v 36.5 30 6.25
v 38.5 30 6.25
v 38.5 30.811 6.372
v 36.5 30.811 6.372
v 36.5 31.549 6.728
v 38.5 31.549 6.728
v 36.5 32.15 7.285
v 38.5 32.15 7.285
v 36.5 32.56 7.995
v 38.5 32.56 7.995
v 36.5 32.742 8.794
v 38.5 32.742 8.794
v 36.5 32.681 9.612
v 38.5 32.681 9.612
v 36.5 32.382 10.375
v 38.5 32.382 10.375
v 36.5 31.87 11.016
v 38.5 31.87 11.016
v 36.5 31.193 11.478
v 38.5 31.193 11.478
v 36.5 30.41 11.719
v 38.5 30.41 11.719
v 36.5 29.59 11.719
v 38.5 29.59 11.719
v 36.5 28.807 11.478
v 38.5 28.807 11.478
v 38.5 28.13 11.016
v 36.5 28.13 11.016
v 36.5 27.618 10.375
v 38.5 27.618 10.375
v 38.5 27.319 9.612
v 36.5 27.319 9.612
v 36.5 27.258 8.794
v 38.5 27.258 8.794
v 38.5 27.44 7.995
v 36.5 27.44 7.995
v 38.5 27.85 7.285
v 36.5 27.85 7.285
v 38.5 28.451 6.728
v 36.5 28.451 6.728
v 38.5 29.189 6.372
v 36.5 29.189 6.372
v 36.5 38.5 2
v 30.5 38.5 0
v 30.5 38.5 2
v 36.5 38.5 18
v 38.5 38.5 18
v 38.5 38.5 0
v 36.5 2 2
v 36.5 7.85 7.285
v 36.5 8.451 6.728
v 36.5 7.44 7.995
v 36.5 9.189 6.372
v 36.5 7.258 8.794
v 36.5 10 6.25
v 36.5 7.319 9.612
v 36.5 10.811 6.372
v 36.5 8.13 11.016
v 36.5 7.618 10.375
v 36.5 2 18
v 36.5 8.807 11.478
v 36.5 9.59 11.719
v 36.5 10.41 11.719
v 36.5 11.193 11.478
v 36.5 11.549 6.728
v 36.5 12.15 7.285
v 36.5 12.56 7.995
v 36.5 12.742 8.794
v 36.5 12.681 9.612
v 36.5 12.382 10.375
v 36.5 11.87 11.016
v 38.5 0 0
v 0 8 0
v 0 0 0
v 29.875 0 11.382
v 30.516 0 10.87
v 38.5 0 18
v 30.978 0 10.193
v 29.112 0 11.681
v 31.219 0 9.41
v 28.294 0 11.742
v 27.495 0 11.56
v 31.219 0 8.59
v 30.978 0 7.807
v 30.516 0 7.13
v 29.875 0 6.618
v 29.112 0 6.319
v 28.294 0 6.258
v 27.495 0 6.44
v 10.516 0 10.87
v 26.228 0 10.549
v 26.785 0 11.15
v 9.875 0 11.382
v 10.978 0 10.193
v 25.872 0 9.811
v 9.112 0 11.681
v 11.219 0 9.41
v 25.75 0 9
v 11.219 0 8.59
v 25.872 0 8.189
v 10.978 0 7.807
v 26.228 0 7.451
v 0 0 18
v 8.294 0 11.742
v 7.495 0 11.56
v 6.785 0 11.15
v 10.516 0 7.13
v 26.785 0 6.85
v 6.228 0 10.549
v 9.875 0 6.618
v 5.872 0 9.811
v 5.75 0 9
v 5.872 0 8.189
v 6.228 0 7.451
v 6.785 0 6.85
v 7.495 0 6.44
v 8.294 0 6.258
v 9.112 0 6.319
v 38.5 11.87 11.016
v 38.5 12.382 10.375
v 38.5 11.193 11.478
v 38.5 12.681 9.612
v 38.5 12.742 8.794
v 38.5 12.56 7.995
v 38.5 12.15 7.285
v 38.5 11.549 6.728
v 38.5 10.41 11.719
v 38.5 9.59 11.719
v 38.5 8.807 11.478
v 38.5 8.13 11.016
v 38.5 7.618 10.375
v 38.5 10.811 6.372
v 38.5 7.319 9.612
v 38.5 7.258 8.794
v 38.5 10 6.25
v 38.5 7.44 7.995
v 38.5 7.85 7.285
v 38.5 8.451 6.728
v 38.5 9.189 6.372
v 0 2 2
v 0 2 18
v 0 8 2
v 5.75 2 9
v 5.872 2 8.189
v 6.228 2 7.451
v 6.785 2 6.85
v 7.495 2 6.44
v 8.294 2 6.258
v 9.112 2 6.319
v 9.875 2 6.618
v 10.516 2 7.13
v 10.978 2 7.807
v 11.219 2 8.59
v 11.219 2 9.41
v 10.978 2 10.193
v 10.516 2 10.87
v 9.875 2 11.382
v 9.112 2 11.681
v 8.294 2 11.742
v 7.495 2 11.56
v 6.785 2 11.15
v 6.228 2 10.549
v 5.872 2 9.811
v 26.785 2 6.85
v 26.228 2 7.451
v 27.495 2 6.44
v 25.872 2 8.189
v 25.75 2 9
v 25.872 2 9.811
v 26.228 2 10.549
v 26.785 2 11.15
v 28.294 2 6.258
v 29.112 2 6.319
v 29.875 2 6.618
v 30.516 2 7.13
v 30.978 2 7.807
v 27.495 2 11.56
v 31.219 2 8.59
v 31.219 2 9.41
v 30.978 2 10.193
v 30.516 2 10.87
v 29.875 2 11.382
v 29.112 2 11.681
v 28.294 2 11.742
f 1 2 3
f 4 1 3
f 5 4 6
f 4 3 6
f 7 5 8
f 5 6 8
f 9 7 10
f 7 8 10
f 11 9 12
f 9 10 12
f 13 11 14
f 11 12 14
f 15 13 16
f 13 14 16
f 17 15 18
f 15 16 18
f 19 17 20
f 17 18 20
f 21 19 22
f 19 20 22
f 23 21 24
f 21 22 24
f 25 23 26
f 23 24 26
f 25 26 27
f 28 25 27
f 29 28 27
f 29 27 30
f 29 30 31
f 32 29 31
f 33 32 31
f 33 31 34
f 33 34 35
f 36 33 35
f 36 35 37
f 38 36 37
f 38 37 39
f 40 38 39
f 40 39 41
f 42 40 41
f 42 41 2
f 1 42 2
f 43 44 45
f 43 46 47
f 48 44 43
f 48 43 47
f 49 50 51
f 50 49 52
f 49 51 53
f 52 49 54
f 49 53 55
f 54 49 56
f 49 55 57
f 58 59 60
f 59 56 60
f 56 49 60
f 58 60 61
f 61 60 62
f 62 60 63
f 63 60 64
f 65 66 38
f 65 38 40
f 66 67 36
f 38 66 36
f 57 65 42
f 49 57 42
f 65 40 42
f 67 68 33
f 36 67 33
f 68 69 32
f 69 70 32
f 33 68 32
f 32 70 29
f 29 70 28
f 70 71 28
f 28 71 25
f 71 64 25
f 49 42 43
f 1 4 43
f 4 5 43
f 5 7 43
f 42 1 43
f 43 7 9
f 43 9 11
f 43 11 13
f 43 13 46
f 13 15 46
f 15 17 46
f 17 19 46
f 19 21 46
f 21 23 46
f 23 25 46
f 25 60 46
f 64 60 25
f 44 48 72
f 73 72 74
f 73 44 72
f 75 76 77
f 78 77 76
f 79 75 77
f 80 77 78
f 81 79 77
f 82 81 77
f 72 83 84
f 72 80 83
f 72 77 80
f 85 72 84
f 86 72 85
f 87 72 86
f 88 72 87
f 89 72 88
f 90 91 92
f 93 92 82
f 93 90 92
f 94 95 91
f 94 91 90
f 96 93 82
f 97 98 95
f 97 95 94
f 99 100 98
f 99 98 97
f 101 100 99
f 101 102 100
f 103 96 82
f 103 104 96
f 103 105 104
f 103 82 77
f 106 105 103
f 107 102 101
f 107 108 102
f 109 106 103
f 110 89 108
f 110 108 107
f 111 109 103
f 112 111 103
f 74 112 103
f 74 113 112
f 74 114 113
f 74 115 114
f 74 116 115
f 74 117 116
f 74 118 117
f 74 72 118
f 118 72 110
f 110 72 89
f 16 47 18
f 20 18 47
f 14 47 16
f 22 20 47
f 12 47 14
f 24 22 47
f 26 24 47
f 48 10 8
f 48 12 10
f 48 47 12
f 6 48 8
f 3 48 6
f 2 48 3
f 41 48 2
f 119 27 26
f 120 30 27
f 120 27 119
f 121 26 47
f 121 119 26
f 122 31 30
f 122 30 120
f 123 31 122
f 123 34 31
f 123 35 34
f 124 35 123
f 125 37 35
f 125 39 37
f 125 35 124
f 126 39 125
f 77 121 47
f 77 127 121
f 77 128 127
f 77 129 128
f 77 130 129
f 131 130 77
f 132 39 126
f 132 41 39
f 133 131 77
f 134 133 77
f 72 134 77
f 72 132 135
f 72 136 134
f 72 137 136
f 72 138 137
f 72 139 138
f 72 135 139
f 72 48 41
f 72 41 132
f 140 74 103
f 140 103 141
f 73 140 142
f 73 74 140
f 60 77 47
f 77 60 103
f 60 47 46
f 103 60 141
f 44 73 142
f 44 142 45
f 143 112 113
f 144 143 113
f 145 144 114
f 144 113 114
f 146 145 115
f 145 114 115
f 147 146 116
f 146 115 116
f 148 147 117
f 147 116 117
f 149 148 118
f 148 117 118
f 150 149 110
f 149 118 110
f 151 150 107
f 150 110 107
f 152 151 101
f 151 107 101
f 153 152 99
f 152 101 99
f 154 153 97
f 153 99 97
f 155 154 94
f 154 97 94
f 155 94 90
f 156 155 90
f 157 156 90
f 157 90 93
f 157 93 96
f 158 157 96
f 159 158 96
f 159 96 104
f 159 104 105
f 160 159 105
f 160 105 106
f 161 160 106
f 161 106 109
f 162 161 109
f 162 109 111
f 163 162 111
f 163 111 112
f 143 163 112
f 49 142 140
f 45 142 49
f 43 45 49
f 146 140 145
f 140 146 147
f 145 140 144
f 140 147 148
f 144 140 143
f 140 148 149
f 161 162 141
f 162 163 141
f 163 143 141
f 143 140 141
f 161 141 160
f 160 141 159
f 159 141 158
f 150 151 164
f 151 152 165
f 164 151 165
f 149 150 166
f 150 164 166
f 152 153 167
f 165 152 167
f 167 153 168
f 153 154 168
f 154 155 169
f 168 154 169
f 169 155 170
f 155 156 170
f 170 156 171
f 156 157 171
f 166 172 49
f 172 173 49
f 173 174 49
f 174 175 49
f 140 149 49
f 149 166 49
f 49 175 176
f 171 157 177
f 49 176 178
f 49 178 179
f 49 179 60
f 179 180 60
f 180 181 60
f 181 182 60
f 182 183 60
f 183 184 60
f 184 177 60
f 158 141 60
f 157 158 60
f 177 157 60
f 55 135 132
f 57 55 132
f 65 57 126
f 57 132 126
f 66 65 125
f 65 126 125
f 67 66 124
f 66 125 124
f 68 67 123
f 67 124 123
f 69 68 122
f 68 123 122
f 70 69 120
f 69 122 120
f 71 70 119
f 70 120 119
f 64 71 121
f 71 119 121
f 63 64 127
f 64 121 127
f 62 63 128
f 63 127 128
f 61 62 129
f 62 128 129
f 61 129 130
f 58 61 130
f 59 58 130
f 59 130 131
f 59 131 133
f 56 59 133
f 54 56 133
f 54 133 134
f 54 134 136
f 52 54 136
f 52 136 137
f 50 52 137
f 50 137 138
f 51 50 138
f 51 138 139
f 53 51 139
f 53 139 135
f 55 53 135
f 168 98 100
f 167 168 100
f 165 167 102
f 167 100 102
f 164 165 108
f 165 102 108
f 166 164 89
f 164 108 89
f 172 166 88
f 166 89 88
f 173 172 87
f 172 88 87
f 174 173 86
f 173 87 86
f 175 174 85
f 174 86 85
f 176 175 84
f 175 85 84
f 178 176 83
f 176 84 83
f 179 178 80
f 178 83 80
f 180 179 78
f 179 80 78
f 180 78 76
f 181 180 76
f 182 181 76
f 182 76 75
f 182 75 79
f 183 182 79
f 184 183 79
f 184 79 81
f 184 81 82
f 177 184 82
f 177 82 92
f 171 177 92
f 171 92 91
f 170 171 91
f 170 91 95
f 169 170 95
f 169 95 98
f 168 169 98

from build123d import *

# Parameters (mm, degrees)
EXTRUDE_1_DEPTH     = 18
CUT_EXTRUDE_1_DEPTH = 16
HOLE_WIZARD_M51_D   = 5.5
HOLE_WIZARD_M52_D   = 5.5


with BuildPart() as part:
    # Эскиз1 → Бобышка-Вытянуть1 (new body)
    with BuildSketch(Plane.XY):
        Polygon((0, 0), (0, 8), (30.5, 38.5), (38.5, 38.5), (38.5, 0), align=None)
    extrude(amount=EXTRUDE_1_DEPTH)

    # Эскиз2 → Вырез-Вытянуть1 (cut)
    with BuildSketch(Plane.XY.offset(18)):
        Polygon((0, 2), (36.5, 2), (36.5, 38.5), (30.5, 38.5), (0, 8), align=None)
    extrude(amount=-CUT_EXTRUDE_1_DEPTH, mode=Mode.SUBTRACT)

    # Отверстие с зазором M51 (through all)
    with Locations(Plane(origin=(0, 2, 0), x_dir=(1, 0, 0), z_dir=(0, 1, 0))):
        with Locations((8.5, -9), (28.5, -9)):
            Hole(HOLE_WIZARD_M51_D / 2)

    # Отверстие с зазором M52 (through all)
    with Locations(Plane.ZY.offset(-36.5)):
        with Locations((9, 10), (9, 30)):
            Hole(HOLE_WIZARD_M52_D / 2)


solid = part.part
